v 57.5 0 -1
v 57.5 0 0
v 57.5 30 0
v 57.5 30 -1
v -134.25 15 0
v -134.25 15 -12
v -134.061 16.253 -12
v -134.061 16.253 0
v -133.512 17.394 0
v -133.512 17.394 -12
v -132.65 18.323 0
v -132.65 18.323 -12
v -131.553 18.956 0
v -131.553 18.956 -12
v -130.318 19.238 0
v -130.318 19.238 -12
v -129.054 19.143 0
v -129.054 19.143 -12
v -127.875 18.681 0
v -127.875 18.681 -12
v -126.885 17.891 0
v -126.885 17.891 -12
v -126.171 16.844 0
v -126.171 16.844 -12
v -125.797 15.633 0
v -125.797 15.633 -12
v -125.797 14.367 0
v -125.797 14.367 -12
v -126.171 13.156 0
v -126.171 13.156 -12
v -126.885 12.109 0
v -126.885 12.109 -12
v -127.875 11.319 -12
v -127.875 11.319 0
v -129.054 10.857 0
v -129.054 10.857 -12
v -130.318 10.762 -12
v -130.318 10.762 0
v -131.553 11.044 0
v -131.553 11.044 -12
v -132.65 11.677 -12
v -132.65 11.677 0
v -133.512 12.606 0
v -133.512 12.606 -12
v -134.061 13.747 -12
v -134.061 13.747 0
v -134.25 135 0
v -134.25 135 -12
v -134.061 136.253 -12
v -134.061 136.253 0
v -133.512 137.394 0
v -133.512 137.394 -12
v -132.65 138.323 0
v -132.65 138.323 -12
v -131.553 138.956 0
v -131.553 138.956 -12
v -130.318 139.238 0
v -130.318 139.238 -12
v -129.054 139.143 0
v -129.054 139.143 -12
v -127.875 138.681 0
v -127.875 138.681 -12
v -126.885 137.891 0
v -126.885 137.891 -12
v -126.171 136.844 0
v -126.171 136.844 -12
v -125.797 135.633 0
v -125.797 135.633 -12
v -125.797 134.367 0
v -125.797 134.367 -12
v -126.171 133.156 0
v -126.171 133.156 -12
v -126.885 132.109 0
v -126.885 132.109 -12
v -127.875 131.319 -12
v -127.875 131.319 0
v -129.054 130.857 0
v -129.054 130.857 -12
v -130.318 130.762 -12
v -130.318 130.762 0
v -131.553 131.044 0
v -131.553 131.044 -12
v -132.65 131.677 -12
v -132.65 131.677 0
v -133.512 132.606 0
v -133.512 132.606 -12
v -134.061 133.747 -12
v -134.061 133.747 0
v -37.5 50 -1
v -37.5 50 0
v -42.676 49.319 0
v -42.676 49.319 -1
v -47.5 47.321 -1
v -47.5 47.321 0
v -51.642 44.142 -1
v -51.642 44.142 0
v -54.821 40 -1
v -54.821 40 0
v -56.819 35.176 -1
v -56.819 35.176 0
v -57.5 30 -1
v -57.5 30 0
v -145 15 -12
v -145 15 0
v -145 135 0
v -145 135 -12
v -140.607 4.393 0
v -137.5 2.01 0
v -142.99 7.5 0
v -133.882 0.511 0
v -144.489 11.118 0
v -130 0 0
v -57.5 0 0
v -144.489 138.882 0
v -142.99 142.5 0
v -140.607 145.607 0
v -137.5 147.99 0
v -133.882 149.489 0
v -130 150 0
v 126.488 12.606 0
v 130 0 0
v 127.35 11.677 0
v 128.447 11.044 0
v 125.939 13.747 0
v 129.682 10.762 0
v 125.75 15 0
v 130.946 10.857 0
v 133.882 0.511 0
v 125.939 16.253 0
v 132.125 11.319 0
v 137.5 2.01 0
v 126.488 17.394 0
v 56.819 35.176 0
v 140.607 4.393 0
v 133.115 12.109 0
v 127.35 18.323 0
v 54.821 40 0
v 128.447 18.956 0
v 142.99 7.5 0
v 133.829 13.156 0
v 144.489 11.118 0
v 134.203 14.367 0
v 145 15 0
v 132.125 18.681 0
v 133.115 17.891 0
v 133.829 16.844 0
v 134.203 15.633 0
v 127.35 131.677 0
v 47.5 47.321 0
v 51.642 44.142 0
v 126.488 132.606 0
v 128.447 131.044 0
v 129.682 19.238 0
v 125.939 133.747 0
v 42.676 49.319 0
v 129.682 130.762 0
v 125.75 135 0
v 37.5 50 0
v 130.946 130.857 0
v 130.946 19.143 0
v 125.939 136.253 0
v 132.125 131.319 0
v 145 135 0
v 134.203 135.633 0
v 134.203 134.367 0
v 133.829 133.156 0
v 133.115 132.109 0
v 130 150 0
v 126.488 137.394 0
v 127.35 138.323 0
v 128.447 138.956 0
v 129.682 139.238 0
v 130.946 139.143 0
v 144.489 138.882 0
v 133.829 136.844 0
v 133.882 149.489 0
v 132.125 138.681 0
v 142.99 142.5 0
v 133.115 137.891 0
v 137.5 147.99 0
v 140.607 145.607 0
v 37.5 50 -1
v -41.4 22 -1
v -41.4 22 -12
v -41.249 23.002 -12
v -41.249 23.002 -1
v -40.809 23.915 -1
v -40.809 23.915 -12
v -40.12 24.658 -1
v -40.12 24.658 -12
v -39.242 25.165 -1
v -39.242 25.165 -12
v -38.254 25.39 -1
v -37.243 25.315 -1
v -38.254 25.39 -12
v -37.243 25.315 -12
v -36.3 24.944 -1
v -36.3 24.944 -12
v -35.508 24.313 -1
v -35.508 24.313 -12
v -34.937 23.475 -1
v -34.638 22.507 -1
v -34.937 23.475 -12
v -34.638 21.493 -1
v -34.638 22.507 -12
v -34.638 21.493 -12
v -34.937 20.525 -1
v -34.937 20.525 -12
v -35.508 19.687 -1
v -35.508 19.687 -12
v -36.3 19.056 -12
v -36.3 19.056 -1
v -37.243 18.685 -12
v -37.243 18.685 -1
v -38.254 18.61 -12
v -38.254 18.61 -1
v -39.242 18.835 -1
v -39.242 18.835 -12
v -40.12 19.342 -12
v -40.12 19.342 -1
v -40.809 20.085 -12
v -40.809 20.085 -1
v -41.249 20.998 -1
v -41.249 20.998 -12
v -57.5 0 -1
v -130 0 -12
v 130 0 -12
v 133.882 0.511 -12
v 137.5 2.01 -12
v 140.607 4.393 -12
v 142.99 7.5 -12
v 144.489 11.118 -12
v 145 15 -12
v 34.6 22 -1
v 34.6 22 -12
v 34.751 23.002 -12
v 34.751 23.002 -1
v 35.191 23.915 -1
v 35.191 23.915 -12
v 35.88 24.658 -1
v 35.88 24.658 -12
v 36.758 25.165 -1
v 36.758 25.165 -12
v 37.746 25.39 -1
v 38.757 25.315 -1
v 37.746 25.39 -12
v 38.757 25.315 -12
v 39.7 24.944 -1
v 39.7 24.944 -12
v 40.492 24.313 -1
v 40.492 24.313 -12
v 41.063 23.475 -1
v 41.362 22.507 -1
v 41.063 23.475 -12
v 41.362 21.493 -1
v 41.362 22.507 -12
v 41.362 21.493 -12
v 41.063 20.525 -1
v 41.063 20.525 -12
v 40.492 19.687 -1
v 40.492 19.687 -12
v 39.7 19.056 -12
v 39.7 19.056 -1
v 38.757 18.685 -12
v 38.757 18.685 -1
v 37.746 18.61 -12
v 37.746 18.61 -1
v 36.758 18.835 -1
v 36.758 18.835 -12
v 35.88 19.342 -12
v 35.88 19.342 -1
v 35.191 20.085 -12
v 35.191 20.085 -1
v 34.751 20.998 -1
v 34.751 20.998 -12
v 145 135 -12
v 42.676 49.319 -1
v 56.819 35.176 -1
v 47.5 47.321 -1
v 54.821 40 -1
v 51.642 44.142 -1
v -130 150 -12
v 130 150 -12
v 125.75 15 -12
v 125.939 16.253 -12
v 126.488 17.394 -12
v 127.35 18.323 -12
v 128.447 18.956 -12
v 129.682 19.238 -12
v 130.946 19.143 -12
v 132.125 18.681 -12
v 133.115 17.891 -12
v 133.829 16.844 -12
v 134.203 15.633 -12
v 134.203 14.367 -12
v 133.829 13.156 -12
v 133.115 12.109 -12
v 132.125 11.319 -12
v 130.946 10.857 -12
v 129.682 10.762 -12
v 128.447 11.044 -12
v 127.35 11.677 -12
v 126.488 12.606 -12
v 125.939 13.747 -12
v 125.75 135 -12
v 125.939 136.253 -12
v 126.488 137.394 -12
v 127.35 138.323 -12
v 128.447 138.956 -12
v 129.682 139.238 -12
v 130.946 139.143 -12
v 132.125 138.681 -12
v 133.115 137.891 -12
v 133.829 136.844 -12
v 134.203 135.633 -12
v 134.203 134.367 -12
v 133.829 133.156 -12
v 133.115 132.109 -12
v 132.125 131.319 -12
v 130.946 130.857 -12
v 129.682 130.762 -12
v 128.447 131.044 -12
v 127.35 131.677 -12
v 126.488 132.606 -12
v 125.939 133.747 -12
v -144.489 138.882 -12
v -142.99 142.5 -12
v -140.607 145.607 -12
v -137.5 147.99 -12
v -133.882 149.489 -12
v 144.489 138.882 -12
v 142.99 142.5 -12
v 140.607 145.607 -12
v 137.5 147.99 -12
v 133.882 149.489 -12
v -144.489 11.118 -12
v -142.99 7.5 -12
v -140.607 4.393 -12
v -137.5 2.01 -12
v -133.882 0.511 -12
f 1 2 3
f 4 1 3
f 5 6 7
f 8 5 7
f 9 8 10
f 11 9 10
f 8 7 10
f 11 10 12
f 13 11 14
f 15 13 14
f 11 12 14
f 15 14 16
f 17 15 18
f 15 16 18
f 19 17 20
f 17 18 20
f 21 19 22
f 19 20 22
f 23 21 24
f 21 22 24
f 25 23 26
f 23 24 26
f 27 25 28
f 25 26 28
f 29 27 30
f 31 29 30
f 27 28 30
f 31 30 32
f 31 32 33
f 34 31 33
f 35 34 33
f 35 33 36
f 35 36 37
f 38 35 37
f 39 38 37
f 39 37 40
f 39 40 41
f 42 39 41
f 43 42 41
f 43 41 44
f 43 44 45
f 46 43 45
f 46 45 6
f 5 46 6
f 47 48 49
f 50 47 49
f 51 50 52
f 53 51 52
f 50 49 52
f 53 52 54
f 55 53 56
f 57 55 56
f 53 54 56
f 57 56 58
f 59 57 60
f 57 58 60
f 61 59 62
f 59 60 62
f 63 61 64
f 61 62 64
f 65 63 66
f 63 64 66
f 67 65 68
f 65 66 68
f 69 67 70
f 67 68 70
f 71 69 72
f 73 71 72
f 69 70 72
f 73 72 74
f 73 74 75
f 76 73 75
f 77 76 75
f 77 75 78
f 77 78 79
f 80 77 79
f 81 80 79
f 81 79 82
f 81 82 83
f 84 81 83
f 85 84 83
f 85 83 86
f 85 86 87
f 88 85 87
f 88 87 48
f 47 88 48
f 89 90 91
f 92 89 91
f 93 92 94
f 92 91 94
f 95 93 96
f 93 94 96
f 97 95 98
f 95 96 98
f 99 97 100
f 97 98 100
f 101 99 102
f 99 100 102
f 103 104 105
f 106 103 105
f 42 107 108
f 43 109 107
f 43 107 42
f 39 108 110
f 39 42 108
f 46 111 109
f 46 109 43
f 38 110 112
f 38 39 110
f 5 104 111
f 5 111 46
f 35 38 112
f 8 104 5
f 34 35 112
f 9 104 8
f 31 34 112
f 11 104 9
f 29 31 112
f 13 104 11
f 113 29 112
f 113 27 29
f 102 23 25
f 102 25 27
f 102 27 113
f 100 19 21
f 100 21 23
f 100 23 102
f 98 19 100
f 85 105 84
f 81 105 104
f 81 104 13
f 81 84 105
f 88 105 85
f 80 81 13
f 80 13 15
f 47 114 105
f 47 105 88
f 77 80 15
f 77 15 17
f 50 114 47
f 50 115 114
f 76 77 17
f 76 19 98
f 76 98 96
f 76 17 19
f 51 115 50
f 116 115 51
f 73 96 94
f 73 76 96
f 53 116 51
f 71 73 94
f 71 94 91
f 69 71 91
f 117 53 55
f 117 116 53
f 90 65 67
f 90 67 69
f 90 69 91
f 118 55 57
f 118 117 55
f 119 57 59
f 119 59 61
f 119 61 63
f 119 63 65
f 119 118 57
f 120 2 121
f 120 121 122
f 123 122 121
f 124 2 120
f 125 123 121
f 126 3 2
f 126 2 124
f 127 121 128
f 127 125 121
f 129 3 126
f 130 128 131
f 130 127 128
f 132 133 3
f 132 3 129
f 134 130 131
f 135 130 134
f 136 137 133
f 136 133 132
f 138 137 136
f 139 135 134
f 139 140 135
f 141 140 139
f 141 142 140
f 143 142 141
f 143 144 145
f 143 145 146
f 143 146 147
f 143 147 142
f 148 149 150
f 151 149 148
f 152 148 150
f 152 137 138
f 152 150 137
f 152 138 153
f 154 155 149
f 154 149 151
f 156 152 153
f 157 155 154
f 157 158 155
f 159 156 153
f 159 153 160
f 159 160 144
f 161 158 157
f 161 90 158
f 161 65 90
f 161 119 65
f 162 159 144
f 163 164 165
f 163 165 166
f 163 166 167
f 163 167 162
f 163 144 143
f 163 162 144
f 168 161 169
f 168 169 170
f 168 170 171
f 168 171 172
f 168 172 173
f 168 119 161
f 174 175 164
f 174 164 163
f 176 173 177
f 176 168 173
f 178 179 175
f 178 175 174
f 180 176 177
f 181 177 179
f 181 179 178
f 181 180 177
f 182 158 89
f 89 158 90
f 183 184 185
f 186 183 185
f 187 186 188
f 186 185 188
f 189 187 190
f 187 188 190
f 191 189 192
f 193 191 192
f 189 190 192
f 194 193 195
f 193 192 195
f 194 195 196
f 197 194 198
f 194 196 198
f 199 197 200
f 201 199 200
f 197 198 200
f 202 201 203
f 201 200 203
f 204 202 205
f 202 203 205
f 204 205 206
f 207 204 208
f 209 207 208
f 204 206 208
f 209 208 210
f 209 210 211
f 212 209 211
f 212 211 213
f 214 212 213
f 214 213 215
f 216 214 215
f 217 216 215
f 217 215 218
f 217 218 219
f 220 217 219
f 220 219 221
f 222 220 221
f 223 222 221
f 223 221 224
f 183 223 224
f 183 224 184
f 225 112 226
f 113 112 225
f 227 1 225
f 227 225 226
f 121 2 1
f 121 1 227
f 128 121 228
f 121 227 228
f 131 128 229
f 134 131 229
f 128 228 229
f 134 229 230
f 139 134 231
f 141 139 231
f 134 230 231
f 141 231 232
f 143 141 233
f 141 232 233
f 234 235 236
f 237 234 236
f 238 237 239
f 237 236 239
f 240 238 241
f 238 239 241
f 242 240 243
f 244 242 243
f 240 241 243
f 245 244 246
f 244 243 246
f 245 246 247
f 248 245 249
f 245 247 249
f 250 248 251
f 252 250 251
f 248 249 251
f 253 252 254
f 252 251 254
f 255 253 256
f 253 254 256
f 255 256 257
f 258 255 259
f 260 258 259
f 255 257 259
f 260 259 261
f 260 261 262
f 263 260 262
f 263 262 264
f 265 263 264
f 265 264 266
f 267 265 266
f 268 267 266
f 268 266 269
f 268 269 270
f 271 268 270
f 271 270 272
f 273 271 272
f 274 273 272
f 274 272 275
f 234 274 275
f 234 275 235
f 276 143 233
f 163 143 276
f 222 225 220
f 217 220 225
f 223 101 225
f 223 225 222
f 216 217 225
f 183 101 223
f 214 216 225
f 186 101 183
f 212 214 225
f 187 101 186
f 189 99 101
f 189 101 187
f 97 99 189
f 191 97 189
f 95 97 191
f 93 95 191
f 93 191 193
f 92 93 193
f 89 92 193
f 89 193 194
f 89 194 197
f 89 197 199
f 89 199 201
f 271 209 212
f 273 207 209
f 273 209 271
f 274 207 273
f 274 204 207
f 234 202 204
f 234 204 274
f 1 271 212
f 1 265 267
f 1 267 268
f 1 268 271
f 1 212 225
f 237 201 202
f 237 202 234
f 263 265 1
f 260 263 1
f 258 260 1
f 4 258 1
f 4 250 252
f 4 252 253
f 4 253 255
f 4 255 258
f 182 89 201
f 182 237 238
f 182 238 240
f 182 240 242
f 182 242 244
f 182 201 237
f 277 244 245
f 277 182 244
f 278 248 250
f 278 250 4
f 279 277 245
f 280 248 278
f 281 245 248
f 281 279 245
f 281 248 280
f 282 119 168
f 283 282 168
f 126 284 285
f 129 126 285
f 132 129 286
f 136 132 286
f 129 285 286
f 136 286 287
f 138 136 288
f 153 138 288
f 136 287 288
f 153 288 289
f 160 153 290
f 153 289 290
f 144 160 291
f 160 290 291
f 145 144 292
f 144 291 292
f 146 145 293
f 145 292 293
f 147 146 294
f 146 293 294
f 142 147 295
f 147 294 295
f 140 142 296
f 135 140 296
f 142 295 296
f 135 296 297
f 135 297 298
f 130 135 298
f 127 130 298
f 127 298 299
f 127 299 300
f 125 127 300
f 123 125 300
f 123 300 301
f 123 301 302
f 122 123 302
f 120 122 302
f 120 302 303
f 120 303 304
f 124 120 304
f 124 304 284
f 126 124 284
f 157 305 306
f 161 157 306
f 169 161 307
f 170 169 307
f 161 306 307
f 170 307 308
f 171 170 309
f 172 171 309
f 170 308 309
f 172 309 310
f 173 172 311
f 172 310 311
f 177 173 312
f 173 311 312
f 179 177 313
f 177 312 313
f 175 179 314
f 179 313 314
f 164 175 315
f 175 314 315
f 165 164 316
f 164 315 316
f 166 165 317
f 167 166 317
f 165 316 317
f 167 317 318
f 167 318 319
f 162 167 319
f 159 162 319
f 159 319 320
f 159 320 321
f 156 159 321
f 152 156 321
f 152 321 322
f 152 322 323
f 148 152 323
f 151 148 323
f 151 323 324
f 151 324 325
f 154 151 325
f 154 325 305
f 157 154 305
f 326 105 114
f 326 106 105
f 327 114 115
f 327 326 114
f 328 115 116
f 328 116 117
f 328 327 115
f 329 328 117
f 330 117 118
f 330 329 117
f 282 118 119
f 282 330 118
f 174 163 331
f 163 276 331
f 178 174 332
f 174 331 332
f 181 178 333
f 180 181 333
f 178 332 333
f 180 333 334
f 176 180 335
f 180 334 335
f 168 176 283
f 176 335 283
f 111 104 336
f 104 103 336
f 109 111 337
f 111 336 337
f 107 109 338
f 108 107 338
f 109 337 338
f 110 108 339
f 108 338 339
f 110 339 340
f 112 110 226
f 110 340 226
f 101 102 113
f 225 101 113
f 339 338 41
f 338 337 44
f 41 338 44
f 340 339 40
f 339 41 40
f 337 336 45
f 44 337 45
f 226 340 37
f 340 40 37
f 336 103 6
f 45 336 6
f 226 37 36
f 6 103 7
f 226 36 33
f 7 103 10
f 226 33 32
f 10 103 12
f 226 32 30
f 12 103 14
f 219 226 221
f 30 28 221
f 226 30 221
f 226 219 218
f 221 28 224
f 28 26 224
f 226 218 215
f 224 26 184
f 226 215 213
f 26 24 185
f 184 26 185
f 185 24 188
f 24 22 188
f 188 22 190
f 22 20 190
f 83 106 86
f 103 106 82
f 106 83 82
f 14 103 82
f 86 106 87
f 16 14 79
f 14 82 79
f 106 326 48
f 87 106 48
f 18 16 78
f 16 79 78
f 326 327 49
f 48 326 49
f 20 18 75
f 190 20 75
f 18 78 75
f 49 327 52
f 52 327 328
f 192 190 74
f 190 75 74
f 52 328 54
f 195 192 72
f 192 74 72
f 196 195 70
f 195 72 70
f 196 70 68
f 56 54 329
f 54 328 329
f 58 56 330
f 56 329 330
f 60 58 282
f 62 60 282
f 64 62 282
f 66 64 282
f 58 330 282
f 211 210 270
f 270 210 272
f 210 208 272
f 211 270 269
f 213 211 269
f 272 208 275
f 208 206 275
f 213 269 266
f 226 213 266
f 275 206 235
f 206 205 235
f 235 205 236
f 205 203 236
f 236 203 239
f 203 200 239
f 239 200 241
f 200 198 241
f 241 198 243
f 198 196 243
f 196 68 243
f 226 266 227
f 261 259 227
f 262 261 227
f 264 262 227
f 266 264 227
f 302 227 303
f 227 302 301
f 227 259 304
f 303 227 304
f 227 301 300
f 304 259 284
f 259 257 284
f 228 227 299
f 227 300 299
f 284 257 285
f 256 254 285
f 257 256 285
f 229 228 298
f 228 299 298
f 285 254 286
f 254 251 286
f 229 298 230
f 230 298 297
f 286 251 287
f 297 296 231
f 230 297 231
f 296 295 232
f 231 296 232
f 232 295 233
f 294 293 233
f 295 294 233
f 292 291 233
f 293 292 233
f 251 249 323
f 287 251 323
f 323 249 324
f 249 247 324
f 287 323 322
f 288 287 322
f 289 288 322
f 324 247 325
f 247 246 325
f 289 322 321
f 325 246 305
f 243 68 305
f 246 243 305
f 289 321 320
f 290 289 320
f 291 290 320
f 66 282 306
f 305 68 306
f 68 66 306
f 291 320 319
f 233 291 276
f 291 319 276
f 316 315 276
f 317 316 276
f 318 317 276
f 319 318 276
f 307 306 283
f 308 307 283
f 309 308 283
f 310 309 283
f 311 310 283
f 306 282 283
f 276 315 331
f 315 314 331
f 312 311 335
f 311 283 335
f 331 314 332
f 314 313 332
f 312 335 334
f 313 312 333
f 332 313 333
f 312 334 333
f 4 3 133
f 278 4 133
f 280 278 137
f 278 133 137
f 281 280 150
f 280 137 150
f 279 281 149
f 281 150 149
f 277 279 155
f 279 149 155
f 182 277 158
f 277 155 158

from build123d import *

# Parameters (mm, degrees)
F0_W     = 290
F0_H     = 150
F1_DEPTH = 12
F2_R     = 15
F4_D     = 8.5
F3_W     = 115
F3_H     = 8
F5_DEPTH = 1
F6_D     = 6.8


with BuildPart() as f1:
    # F0 (on Top) → F1 (new body)
    with BuildSketch(Plane.XY):
        with Locations((0, 75)):
            Rectangle(F0_W, F0_H)
    extrude(amount=-F1_DEPTH)

    # F2
    f2_edges = [f1.edges().sort_by_distance(p)[0] for p in [
        (-145, 150, -6),
        (-145, 0, -6),
        (145, 150, -6),
        (145, 0, -6),
    ]]
    fillet(f2_edges, radius=F2_R)

    # F4 (through all)
    with Locations(Plane.XY):
        with Locations((130, 135), (130, 15), (-130, 135), (-130, 15)):
            Hole(F4_D / 2)

    # F3 (on face) → F5 (cut)
    with BuildSketch(Plane.XY):
        with Locations((0, -4)):
            Rectangle(F3_W, F3_H)
        with BuildLine():
            Line((57.5, 0), (57.5, 30))
            ThreePointArc((57.5, 30), (51.6421356237, 44.1421356237), (37.5, 50))
            Line((37.5, 50), (-37.5, 50))
            ThreePointArc((-37.5, 50), (-51.6421356237, 44.1421356237), (-57.5, 30))
            Line((-57.5, 30), (-57.5, 0))
            Line((-57.5, 0), (57.5, 0))
        make_face()
    extrude(amount=-F5_DEPTH, mode=Mode.SUBTRACT)

    # F6 (through all)
    with Locations(Plane.XY):
        with Locations((38, 22), (-38, 22)):
            Hole(F6_D / 2)


solid = f1.part
